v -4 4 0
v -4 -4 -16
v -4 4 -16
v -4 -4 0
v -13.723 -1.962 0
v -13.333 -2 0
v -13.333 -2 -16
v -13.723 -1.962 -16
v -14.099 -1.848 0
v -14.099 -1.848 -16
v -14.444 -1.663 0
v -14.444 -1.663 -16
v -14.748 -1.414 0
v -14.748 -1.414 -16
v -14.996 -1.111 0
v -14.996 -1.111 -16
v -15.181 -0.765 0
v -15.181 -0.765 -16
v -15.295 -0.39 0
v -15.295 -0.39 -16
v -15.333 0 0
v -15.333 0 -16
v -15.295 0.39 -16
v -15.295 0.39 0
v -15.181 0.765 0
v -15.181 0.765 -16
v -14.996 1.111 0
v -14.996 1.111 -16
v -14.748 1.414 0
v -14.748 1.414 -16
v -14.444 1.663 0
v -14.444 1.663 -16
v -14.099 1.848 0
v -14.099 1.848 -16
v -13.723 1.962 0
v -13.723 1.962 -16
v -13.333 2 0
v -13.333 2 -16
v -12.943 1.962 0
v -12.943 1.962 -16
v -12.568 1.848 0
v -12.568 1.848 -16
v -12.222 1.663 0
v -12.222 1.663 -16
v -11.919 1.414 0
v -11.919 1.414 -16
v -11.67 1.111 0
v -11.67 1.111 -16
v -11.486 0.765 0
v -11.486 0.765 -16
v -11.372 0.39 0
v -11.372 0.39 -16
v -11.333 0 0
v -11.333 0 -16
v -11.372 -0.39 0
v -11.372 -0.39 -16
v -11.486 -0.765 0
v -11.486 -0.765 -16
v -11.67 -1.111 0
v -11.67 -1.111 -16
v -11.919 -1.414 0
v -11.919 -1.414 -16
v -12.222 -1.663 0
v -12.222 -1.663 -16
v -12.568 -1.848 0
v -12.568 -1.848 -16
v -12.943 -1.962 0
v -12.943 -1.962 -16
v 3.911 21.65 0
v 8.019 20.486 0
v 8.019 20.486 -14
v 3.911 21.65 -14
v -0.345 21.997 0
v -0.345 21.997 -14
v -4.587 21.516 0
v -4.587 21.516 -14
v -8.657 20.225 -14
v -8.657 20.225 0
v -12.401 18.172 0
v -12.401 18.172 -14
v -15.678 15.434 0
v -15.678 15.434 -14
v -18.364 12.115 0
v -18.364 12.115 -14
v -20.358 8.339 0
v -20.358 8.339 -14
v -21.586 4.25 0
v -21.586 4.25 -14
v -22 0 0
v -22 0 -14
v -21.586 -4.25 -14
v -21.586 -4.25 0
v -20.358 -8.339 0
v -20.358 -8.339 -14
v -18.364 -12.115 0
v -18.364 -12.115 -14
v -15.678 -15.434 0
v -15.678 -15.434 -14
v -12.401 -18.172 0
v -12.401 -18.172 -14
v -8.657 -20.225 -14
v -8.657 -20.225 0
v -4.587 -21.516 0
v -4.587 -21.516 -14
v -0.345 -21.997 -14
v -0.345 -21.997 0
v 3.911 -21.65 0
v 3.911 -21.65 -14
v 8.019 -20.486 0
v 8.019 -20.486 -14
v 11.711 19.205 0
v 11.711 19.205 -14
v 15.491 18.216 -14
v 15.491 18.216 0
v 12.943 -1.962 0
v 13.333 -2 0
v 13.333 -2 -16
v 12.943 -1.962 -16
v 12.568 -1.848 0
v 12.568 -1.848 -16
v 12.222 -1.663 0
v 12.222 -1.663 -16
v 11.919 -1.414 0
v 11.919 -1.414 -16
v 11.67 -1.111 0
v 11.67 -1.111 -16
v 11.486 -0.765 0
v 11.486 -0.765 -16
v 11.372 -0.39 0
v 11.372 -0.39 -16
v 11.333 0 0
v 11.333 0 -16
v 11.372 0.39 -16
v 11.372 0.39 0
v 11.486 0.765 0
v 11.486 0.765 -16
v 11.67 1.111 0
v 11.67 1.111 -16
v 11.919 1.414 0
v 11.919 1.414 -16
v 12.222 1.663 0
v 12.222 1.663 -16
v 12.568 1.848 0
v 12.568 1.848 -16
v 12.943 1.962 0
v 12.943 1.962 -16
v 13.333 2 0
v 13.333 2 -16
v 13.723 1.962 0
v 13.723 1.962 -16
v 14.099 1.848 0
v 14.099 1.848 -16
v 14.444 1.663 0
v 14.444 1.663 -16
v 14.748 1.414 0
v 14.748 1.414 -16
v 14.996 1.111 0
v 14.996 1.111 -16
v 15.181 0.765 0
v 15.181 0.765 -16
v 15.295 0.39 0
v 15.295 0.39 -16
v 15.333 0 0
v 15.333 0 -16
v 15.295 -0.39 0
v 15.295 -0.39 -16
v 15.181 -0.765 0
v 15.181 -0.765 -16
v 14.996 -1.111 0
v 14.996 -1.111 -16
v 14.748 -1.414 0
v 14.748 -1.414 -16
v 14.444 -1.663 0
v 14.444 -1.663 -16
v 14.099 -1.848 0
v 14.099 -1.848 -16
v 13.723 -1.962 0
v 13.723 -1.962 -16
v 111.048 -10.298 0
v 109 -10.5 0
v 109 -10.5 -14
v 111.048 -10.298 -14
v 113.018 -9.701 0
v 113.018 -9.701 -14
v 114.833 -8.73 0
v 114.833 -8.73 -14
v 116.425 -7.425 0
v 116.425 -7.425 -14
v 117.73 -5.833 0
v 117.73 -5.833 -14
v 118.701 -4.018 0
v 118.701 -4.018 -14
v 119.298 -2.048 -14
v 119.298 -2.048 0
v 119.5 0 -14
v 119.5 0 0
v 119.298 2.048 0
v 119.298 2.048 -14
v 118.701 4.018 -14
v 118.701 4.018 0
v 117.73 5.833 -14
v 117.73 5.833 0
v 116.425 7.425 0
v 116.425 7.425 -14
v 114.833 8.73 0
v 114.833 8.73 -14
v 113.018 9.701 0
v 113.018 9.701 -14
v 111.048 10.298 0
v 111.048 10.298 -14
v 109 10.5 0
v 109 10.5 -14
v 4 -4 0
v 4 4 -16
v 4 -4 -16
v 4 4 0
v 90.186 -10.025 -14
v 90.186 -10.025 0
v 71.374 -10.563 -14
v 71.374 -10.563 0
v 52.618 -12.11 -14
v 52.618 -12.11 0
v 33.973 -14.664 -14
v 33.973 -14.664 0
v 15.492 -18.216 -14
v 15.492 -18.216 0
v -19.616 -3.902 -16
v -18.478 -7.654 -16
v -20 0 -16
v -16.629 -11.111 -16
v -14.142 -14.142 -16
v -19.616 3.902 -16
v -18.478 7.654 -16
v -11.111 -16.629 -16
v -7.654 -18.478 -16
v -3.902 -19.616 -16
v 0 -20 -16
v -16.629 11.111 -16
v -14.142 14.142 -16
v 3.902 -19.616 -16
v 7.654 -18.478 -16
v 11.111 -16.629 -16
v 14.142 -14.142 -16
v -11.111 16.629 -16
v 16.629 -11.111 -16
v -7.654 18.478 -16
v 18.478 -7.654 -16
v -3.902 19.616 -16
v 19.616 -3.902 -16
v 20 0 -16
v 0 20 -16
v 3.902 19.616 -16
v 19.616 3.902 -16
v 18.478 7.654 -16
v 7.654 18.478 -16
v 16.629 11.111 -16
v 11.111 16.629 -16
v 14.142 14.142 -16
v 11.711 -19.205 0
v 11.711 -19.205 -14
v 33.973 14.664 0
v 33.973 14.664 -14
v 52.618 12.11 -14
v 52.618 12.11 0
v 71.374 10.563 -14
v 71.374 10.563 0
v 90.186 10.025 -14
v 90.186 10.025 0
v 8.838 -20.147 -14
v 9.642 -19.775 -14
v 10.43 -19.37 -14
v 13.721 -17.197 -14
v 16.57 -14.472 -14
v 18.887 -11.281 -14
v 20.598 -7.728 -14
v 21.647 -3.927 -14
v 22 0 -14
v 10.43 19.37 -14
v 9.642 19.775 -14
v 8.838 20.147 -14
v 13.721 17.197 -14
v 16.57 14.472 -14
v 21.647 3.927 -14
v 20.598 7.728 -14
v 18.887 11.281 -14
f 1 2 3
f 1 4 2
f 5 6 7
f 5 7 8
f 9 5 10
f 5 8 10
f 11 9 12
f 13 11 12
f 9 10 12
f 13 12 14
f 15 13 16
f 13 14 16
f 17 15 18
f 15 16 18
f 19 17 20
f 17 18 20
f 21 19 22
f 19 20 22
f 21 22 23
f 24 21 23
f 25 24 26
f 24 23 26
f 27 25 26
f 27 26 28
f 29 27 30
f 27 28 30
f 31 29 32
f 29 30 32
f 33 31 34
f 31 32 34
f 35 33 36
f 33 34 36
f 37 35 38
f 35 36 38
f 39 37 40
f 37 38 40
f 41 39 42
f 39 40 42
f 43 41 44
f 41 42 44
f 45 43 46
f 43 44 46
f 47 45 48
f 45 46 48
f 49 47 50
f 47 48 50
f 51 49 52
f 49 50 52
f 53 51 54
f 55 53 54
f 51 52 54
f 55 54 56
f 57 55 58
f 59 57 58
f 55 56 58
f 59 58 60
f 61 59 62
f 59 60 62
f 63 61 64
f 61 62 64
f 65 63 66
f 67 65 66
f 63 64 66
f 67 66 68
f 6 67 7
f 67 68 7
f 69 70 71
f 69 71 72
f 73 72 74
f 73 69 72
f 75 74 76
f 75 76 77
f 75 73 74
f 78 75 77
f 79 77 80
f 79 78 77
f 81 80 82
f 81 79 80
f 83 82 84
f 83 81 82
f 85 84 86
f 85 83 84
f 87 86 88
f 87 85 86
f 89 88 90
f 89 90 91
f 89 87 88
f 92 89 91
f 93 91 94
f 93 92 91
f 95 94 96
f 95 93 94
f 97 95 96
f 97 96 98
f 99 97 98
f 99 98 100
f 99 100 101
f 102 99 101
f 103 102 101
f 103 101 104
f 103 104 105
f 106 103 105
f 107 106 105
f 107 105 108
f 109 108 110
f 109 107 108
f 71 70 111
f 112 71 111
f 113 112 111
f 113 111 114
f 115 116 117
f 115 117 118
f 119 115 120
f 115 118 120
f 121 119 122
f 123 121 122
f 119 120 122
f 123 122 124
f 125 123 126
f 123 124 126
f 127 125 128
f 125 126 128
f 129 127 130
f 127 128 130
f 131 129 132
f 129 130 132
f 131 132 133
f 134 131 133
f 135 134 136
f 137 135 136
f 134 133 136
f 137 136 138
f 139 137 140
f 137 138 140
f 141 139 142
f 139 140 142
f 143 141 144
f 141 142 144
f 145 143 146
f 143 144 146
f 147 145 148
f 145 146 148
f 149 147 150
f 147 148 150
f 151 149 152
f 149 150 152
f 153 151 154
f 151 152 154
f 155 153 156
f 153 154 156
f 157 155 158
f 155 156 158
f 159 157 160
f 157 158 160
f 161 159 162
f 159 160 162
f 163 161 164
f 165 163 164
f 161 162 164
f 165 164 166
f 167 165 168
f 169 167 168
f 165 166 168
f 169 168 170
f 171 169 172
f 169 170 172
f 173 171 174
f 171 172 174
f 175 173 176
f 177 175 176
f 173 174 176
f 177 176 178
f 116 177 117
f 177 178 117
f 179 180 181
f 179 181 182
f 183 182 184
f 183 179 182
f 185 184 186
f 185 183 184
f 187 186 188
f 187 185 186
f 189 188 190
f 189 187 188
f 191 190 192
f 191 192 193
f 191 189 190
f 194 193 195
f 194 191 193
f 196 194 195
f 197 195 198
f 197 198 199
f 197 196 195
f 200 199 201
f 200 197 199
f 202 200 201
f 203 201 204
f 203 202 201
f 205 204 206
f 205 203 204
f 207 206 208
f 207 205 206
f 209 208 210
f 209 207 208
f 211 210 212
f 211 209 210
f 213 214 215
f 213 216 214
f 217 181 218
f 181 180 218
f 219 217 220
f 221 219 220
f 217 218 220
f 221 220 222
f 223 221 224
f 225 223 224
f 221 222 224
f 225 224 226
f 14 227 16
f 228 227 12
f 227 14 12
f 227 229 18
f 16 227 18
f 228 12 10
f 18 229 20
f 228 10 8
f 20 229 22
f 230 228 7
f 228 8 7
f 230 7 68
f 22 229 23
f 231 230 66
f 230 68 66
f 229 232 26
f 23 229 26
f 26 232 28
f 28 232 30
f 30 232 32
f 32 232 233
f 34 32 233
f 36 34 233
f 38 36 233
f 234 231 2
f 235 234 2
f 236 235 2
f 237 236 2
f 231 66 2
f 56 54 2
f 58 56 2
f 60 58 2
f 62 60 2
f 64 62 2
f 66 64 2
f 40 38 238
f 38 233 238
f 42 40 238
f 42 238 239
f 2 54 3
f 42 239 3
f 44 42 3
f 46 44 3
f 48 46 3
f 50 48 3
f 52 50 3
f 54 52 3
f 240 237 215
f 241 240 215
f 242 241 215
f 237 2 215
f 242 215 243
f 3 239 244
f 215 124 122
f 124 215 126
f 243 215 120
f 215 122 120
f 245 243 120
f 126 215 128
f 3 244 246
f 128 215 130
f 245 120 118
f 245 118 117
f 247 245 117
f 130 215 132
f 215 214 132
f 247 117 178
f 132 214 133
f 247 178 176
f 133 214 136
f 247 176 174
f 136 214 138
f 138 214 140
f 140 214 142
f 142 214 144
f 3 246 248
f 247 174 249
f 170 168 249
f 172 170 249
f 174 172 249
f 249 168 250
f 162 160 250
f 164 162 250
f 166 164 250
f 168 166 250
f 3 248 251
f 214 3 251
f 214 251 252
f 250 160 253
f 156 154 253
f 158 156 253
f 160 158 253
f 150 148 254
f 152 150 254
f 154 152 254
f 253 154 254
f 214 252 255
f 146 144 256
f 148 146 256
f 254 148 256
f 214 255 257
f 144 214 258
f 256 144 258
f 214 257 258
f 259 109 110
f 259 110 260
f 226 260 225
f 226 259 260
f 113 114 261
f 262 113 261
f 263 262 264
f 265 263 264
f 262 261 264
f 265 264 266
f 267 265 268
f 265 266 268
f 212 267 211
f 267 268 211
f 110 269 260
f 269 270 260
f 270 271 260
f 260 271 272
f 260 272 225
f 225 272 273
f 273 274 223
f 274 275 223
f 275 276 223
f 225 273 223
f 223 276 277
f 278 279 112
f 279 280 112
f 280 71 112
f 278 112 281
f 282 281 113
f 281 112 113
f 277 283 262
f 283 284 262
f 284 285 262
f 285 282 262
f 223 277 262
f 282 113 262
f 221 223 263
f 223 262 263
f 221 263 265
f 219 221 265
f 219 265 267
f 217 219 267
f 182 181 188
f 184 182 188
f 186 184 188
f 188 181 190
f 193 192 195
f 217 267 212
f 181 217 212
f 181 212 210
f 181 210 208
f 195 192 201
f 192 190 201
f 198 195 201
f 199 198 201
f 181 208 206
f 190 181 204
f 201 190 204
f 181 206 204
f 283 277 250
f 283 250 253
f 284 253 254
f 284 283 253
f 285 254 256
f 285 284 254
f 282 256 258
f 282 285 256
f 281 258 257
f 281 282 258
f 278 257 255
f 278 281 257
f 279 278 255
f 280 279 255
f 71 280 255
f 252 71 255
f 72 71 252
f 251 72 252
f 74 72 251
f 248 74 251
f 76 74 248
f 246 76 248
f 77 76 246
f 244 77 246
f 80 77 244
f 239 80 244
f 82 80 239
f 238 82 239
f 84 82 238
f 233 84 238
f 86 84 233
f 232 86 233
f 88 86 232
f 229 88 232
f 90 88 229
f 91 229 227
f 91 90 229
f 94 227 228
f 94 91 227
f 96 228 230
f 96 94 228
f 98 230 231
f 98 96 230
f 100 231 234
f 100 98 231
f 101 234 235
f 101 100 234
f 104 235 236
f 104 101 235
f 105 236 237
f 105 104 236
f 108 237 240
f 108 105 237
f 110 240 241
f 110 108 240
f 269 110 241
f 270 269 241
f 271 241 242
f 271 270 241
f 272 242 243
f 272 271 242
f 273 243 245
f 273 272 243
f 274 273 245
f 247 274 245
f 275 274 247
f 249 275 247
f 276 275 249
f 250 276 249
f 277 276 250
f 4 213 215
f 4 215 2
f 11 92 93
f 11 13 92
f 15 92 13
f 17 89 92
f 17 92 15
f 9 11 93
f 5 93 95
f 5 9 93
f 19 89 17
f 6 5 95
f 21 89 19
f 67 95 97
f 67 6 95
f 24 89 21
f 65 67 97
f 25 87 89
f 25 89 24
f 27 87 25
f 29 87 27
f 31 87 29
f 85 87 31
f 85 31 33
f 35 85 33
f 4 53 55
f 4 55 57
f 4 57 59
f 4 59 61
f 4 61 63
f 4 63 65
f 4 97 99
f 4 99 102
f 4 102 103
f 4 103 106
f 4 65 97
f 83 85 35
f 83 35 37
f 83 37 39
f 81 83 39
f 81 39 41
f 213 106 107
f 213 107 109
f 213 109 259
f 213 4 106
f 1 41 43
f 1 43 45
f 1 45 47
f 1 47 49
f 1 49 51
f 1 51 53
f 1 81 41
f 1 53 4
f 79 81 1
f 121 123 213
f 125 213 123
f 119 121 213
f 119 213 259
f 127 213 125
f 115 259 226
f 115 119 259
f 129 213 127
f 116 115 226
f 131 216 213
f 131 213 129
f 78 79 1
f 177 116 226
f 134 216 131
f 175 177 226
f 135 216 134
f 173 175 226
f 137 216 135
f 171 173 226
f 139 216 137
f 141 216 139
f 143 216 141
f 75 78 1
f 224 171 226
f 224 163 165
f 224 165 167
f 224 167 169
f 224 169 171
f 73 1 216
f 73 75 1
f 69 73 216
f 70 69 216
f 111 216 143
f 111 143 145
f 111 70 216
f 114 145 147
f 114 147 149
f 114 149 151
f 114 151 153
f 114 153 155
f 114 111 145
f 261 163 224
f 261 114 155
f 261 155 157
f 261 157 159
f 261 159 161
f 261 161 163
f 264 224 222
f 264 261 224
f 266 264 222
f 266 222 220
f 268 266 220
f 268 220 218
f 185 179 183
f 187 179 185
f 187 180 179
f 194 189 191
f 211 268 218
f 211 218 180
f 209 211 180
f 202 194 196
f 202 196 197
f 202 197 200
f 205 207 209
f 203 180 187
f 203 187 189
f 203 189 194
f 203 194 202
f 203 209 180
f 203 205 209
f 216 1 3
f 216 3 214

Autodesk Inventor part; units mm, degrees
ref_plane "YZ Plane" through (0, 0, 0) normal (1, 0, 0) x (0, 1, 0)
ref_plane "XZ Plane" through (0, 0, 0) normal (0, 1, 0) x (-1, 0, 0)
ref_plane "XY Plane" through (0, 0, 0) normal (0, 0, 1) x (1, 0, 0)
sketch "Эскиз1" plane through (0, 0, 0) normal (0, 0, 1) x (1, 0, 0)
  circle A0 centre (0, 0) radius 22
  line L0 (-4, 4) -> (4, 4)
  line L1 (4, 4) -> (4, -4)
  line L2 (4, -4) -> (-4, -4)
  line L3 (-4, -4) -> (-4, 4)
  line L4 (-4, 4) -> (4, -4) construction
  line L5 (4, 4) -> (-4, -4) construction
  circle A1 centre (0, 13.3333) radius 2
  circle A2 centre (-13.3333, 0) radius 2
  circle A3 centre (0, -13.3333) radius 2
  circle A4 centre (13.3333, 0) radius 2
  dimension "d0" = 44
  dimension "d1" = 8
  dimension "d2" = 8
  dimension "d3" = 4
  dimension "d5" = 13.3333
  dimension "d6" = 0
  dimension "d9" = 360
extrude "Выдавливание1" add sketch "Эскиз1" against normal blind 16 contours A0 | A1 | A2 | A3 | A4
hole "Отверстие1" at (13.3333, 0, 0) direction (0, 0, -1) diameter 4 end through all clearance for "с потайной головкой ГОСТ 12876-67" size "M4" standard "ГОСТ"
hole "Отверстие2" at (-13.3333, 0, 0) direction (0, 0, -1) diameter 4 end through all clearance for "с потайной головкой ГОСТ 12876-67" size "M4" standard "ГОСТ"
chamfer "Фаска1" distance 2 angle 45 1 edges at (-22, 0, -16)
ref_plane "РабПлоскость1" through (109, -4, 0) normal (-1, 0, 0) x (0, 0, 1)
sketch "Эскиз2" plane through (4, -4, 0) normal (-1, 0, 0) x (0, 0, 1)
  line L0 (0, -18) -> (0, 26) projected
  line L1 (-14, 26) -> (-14, -18) projected
  line L2 (-14, -18) -> (0, -18)
  line L3 (-14, 26) -> (0, 26)
sketch "Эскиз3" plane through (109, -4, 0) normal (-1, 0, 0) x (0, 0, 1)
  line L0 (0, -18) -> (0, 26) construction
  line L1 (-14, 26) -> (-14, -18) construction
  line L2 (0, -6.5) -> (-14, -6.5)
  line L3 (-14, -6.5) -> (-14, 14.5)
  line L4 (-14, 14.5) -> (0, 14.5)
  line L5 (0, 14.5) -> (0, -6.5)
  point P0 (0, 4)
  point P1 (0, 4)
  dimension "d53" = 21
  dimension "d54" = 14
sketch "Эскиз4" plane through (0, 0, 0) normal (0, 0, 1) x (1, 0, 0)
  circle A0 centre (0, 0) radius 22 construction
  line L0 (0, -22) -> (0, -4)
  arc A1 (0, 22) -> (109, 10.5) centre (90.7698, 360.0249) ccw
  arc A2 (109, -10.5) -> (0, -22) centre (90.7698, -360.0249) ccw
  line L1 (109, -10.5) -> (109, 10.5)
  circle A3 centre (13.3333, 0) radius 2 projected
  line L2 (4, 4) -> (4, -4) projected
  line L3 (-4, 4) -> (4, 4) projected
  line L4 (4, -4) -> (-4, -4) projected
  line L5 (0, -4) -> (0, 4) construction
  line L6 (0, 4) -> (0, 22)
  line L7 (0, -43.0669) -> (0, 43.0669) construction
  arc A4 (109, -10.5) -> (109, 10.5) centre (109, 0) ccw
  point P0 (109, 10.5)
  point P1 (109, -10.5)
  dimension "d55" = 350
  dimension "d56" = 350
extrude "Выдавливание2" add sketch "Эскиз4" against normal blind 14
fillet "Сопряжение1" radius 50 2 edges at (10.4303, 19.3703, -7) (10.4303, -19.3703, -7)
equation "\"d53\" = 1.5 * d54"
equation "\"d56\" = d55"
properties part number "Ручной привод"
